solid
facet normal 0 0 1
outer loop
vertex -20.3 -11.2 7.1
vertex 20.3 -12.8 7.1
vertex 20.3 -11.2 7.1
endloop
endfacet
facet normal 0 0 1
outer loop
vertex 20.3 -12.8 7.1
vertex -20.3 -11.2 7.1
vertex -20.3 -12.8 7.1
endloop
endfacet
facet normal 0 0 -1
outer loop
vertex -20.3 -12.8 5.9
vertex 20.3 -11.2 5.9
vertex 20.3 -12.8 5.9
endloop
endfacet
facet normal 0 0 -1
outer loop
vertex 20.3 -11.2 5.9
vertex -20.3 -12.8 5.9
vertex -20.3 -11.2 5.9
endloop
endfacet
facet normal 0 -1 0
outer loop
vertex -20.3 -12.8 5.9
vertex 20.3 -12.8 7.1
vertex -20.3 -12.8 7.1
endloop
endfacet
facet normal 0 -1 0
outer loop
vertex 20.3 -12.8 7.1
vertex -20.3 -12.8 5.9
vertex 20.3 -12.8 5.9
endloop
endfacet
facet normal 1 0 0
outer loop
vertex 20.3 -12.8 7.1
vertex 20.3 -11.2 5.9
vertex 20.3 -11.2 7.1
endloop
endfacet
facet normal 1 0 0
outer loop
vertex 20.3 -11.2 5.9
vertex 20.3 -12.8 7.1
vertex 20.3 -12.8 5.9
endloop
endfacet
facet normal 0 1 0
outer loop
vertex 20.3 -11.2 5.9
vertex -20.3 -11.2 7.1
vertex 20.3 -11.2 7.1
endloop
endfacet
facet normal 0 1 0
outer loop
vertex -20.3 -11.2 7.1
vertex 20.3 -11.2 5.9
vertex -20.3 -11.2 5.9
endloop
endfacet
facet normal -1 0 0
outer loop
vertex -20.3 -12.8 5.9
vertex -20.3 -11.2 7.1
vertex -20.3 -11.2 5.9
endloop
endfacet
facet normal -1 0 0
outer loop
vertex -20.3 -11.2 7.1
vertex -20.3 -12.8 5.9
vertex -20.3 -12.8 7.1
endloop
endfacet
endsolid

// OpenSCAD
// Minimal original stop expression; not an electronic footprint.
translate([0,-12,6.5]) cube([40.6,1.6,1.2],center=true);
// Docked 60 mm remote centred Y=-42 ends at Y=-12.
